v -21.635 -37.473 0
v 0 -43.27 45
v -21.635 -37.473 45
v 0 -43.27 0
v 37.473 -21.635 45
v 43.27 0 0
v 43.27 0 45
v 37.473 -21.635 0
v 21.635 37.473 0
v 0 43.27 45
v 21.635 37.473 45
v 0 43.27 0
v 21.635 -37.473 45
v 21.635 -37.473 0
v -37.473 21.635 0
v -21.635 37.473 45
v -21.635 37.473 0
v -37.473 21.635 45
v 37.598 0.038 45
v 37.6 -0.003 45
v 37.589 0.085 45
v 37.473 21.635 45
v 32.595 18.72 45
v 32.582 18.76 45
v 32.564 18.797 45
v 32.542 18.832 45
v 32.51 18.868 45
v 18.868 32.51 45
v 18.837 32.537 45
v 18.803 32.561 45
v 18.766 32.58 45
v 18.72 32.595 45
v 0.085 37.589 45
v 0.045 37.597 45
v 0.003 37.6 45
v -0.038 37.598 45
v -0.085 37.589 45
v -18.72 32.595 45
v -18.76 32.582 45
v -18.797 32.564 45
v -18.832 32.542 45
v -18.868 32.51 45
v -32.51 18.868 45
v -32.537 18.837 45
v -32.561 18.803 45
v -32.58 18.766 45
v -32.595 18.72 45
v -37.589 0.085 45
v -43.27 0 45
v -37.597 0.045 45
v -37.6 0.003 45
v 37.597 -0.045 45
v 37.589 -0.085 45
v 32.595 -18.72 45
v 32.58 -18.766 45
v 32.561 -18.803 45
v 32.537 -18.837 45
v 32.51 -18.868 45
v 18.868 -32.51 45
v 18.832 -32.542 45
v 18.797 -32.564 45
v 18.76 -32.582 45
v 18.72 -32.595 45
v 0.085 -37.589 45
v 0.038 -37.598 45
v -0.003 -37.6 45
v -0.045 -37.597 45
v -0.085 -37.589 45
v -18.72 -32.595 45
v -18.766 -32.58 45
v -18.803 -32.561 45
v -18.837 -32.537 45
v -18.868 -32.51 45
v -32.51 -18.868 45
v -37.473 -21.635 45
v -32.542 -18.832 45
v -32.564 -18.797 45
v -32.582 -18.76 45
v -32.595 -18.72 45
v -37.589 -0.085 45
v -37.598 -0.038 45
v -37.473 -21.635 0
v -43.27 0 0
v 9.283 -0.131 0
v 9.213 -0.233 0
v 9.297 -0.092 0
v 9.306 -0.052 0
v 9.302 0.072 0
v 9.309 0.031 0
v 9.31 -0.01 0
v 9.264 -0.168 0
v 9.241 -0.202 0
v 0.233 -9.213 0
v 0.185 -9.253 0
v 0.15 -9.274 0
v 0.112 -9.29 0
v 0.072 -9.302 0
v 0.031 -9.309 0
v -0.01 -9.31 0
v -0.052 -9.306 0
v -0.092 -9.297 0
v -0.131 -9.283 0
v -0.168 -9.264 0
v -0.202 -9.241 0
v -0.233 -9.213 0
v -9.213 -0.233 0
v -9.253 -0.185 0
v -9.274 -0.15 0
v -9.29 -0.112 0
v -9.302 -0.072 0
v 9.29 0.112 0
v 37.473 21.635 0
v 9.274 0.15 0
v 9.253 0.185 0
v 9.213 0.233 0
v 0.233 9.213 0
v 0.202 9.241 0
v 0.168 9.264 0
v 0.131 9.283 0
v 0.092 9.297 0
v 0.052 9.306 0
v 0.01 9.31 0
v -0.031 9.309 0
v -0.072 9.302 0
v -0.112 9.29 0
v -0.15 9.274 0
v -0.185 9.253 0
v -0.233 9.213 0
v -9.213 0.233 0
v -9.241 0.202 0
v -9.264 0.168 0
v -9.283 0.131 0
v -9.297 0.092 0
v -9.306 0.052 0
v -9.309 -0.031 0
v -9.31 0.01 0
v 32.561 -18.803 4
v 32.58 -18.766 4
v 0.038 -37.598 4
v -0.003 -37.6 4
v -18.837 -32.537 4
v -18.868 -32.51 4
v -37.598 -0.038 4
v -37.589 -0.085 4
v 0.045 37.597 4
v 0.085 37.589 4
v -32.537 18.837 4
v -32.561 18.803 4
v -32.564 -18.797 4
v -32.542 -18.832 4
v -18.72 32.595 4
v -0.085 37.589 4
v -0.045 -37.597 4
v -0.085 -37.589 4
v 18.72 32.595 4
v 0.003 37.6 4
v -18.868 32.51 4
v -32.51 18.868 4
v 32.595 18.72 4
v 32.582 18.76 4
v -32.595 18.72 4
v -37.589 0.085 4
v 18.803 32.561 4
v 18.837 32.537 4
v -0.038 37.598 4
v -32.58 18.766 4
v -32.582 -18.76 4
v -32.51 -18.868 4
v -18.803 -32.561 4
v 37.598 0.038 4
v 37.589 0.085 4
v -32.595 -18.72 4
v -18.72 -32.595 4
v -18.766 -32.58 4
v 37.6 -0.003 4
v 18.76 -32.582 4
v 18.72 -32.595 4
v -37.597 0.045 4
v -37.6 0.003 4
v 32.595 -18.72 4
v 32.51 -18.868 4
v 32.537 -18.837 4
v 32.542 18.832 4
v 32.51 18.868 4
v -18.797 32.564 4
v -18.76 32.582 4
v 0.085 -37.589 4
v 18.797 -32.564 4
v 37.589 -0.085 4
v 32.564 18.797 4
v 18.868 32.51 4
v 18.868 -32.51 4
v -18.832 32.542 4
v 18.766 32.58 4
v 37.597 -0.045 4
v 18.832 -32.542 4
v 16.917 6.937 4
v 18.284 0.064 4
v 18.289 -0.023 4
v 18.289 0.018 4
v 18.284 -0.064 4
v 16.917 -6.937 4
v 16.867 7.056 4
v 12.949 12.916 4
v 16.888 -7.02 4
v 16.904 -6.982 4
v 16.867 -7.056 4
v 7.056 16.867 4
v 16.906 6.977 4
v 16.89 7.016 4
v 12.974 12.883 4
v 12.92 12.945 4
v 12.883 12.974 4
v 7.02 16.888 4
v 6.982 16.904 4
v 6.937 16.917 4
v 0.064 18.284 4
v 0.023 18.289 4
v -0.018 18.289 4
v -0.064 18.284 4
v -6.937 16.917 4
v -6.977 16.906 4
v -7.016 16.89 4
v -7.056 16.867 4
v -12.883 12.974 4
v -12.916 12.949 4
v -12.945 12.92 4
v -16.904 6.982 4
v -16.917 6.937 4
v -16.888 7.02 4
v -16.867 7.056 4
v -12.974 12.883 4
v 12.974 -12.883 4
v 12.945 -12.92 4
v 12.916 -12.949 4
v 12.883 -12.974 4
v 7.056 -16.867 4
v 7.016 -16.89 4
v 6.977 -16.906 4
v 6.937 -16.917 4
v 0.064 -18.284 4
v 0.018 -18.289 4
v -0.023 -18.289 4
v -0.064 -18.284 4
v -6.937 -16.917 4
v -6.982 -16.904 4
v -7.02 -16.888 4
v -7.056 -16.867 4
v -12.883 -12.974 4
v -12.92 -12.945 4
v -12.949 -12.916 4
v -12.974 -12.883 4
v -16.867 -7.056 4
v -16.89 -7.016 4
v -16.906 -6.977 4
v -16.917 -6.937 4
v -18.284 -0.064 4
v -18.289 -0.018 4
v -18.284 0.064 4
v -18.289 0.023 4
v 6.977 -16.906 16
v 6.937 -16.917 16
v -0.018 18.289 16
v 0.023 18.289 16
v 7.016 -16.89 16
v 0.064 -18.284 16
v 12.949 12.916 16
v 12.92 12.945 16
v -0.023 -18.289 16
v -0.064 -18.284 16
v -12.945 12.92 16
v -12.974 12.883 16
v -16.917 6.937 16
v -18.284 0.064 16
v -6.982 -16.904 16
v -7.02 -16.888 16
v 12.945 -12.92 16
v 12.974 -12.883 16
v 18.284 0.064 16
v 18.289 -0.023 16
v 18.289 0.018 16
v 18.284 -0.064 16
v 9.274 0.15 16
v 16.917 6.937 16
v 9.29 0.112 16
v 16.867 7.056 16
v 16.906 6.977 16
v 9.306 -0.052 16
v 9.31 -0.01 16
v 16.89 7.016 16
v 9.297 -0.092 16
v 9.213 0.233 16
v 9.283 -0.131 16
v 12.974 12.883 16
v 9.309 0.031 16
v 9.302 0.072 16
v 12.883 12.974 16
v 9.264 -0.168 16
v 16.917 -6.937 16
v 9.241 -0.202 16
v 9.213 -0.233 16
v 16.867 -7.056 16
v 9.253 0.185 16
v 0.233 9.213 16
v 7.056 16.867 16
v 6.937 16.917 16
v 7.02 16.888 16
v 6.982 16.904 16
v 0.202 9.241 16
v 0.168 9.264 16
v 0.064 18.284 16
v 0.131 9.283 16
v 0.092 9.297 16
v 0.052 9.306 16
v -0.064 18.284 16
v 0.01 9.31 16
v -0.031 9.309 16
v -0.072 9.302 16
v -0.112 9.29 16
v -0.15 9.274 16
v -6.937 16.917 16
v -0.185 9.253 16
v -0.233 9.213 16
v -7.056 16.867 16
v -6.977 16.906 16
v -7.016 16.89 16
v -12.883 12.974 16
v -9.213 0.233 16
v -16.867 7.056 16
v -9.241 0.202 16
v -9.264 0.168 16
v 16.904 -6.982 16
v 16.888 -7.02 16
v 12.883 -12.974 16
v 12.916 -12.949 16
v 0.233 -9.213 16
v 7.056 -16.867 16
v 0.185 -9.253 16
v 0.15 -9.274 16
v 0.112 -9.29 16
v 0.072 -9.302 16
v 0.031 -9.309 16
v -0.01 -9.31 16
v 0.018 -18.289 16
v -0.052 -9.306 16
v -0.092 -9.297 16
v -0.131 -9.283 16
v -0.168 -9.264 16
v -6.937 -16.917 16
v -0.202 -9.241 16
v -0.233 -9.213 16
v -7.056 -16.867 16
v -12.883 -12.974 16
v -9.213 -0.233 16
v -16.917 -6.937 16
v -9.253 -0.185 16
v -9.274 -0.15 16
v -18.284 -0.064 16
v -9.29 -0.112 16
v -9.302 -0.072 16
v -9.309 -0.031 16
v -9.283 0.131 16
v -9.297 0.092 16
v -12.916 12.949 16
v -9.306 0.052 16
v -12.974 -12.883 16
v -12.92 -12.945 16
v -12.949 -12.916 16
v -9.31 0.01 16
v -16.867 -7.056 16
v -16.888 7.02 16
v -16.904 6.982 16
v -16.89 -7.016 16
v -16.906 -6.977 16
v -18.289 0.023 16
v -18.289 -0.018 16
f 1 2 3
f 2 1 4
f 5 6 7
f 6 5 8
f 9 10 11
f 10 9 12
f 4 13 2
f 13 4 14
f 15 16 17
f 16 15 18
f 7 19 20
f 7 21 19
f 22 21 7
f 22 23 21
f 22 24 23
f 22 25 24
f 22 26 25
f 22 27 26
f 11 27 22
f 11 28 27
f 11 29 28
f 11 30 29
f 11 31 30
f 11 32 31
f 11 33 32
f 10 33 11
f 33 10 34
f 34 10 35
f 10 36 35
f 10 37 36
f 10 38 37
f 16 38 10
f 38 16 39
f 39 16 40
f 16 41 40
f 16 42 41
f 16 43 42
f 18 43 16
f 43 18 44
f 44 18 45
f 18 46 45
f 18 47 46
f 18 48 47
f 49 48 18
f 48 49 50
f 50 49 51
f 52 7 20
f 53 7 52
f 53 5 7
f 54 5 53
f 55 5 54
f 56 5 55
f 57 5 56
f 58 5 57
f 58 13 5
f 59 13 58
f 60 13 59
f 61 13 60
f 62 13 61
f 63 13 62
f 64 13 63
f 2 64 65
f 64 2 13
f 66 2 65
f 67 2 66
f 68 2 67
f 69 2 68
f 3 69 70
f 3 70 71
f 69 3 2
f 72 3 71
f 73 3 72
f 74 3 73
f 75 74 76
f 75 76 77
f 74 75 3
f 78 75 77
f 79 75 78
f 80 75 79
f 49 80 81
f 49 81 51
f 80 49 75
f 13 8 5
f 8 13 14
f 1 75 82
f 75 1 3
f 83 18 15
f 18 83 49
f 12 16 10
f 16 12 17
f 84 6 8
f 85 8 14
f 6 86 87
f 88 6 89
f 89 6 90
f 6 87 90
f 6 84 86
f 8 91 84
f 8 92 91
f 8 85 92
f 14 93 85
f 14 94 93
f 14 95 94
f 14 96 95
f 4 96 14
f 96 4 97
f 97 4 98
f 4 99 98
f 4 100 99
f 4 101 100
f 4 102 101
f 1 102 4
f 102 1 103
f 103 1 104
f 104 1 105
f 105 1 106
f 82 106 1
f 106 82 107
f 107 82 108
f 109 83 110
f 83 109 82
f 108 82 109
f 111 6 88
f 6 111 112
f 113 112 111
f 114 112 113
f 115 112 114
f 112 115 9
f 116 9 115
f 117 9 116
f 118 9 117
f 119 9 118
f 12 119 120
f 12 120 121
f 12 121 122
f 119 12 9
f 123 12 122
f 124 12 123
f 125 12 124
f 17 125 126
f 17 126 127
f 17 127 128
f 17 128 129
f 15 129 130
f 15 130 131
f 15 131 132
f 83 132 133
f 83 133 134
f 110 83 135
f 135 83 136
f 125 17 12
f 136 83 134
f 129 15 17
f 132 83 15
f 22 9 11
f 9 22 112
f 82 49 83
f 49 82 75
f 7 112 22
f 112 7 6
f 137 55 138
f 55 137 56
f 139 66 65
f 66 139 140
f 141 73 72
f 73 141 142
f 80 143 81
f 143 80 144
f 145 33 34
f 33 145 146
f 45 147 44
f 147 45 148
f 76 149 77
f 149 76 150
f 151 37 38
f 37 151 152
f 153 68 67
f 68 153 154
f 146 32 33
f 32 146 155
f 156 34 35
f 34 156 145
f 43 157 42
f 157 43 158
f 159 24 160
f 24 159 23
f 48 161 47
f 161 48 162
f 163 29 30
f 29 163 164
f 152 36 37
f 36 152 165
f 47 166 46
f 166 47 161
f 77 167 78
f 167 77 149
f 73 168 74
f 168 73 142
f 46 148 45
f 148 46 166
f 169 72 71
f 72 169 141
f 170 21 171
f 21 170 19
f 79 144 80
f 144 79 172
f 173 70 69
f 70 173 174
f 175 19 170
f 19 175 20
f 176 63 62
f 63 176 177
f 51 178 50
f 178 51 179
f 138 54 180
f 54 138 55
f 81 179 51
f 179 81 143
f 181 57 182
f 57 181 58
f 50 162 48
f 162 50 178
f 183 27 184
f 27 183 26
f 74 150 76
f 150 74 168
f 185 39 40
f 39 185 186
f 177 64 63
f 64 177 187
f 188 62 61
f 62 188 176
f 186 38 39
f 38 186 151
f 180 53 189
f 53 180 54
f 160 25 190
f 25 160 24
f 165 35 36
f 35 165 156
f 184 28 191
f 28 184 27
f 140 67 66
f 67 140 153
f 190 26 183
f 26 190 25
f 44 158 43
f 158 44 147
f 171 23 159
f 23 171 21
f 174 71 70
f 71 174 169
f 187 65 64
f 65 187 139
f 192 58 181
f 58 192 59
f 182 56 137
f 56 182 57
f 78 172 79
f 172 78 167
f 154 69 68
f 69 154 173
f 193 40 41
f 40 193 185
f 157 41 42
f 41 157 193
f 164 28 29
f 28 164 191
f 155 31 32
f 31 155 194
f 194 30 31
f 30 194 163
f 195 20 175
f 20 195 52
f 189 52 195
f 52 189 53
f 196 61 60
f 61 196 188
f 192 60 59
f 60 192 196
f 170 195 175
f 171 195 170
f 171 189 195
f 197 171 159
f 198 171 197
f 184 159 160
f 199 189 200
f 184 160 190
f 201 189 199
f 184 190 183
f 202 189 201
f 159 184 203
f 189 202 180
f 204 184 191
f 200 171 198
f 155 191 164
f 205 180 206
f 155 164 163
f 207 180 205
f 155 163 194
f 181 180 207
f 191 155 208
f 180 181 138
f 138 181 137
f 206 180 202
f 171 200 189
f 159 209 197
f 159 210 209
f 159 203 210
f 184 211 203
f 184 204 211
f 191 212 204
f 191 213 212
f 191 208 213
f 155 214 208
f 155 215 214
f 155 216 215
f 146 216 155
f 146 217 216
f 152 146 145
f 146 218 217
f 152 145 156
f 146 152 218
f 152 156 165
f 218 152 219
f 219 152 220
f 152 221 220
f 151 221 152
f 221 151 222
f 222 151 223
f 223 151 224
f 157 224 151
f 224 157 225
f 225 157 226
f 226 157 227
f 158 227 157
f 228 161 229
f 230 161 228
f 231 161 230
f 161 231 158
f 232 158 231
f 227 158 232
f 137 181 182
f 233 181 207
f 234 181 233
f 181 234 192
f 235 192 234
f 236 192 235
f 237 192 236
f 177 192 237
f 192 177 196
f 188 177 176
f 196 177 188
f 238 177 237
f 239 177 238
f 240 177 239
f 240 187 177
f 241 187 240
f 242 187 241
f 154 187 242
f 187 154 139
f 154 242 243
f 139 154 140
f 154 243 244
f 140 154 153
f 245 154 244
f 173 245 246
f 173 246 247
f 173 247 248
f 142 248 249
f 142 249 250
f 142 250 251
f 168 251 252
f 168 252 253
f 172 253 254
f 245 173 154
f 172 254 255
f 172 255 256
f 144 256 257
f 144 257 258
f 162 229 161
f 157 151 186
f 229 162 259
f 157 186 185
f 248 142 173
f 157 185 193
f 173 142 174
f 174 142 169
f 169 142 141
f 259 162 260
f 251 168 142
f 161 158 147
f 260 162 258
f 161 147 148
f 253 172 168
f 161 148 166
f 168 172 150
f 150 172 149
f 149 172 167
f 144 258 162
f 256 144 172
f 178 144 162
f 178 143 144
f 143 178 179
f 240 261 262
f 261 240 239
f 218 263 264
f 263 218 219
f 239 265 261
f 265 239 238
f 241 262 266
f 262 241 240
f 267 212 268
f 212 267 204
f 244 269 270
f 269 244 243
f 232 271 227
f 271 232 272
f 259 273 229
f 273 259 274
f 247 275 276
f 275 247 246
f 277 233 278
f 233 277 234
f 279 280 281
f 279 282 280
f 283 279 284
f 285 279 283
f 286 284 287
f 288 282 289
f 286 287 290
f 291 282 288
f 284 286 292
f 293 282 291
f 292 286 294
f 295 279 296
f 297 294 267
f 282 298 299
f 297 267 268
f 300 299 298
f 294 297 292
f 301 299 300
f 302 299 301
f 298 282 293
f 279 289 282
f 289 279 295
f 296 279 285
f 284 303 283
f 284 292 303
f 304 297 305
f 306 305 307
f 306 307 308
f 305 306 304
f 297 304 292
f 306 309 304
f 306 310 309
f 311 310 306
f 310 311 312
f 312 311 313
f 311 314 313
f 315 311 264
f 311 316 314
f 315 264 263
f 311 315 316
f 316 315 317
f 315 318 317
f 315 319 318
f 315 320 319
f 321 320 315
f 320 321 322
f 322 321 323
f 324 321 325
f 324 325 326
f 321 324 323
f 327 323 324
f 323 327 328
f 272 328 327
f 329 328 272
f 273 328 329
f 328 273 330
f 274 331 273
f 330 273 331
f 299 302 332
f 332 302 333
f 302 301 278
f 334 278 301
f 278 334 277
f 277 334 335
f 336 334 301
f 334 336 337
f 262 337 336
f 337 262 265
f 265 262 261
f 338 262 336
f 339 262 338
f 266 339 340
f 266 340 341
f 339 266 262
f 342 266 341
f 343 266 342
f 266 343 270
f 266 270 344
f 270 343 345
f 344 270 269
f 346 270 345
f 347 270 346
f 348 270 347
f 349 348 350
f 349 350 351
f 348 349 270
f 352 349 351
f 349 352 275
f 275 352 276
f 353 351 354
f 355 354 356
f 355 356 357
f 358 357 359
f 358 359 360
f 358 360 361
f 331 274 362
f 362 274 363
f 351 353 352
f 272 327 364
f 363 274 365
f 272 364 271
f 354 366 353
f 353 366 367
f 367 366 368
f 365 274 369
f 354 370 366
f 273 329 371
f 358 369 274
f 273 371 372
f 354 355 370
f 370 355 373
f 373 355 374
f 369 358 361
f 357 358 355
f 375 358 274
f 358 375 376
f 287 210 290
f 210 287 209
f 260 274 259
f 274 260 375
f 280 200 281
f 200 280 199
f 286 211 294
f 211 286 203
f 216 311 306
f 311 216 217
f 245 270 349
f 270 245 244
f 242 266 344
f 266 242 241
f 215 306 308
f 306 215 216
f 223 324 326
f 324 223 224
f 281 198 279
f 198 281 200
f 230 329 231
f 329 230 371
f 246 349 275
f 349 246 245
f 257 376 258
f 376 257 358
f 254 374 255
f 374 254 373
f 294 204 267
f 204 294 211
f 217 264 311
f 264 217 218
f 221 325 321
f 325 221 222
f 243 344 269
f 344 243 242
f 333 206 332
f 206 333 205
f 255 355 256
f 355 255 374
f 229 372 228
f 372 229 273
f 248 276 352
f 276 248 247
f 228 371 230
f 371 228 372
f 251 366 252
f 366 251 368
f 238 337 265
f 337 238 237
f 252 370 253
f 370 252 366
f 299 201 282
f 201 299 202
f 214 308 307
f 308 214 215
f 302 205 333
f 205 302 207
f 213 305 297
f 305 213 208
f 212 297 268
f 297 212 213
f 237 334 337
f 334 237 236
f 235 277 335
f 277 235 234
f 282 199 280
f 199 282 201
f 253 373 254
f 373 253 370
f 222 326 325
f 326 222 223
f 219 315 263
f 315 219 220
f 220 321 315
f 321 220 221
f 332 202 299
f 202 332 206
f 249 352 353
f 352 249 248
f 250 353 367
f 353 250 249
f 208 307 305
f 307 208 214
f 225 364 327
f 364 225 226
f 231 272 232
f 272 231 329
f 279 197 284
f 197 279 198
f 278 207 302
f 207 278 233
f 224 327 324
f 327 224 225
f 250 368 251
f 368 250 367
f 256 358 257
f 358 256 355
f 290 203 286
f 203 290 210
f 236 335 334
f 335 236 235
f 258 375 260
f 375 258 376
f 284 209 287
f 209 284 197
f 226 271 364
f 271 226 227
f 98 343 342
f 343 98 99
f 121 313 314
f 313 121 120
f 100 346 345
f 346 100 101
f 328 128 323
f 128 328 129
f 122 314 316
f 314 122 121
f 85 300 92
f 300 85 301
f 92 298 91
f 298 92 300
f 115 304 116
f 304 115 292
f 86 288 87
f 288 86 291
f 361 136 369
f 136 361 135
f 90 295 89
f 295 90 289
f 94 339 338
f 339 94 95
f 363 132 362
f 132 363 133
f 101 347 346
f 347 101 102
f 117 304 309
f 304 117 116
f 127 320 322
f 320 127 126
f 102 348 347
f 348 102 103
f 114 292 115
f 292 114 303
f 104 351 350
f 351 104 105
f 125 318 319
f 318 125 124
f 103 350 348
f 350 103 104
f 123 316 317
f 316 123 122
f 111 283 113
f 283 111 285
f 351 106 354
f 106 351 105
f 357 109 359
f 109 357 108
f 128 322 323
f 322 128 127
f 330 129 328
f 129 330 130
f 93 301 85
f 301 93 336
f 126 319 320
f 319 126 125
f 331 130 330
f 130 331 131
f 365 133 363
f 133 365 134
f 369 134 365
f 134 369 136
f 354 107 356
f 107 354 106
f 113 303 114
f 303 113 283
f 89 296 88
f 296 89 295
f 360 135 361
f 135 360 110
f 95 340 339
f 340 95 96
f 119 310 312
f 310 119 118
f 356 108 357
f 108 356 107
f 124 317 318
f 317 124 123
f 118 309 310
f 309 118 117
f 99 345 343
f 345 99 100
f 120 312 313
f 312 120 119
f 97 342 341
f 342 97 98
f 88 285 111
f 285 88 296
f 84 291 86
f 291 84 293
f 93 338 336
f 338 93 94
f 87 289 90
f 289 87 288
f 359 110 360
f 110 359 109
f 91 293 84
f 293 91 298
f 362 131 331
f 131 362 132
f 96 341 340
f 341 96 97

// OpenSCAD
// NOTE:  All dimensions in mm except ratchet size

// version 5:  Use face-to-face measurement for even number of sides


//-------------------------------------------
//        User-entered parameters
//
//  Formatted for thingiverse customizer.
//-------------------------------------------

// Number of faces on filter body:
num_faces = 12;                     // [6:30]

// Diameter of filter body in mm.  Measure from face to face (even) or face to vertex (odd).
filter_diameter_mm = 72;

// Depth of usable portion of tool in mm.  (Height above bottom and drive).
usable_tool_depth_mm = 29;

// Ratchet drive size in inches.
drive_size_inches = 0.5;            // [0.375, 0.5]

// Thickness of tool wall in mm.
wall_thickness_mm = 6;

// Thickness of tool bottom in mm.
bottom_thickness_mm = 4;

// Make the outside round?
round_outside = 0;                  // [0:No,1:Yes]




/* [Hidden] */

$fn=50;

// Compute the radius from center to inner corner:
angle = 180 / num_faces;
r_to_face_if_odd_mm = (cos(angle) / (1+cos(angle))) * filter_diameter_mm;
R_if_even_mm = (filter_diameter_mm / 2) / cos(angle);
is_odd = (num_faces % 2);
radius_to_corners_mm = is_odd ? filter_diameter_mm - r_to_face_if_odd_mm : R_if_even_mm;     // from center to "corner", not face
filter_slop_r_mm = 0.33;

//echo (radius_to_corners_mm);

// 1/2" drive is exactly 8.98mm radius
// 3/8" drive is exactly 6.74mm radius
drive_hole_r_mm = (drive_size_inches > 0.4) ?  8.98 :  6.74;

// 1/2" drive is 16mm tall
// 3/8" drive is 11mm tall
drive_height_mm = (drive_size_inches > 0.4) ? 16.00 : 11.00;

drive_hole_slop_r_mm = 0.33;
drive_thickness_r_mm = drive_hole_r_mm;

outside_faces = round_outside ? 100 : num_faces;
outside_height_mm = usable_tool_depth_mm + max(drive_height_mm,bottom_thickness_mm);



difference()
{
    union()
    {
        difference()
        {
            // Outside body:
            linear_extrude(outside_height_mm)
                my_regular_polygon(outside_faces, radius_to_corners_mm+wall_thickness_mm);
            
            // Main Polygon hole:
            translate([0,0,bottom_thickness_mm])
                linear_extrude(outside_height_mm - bottom_thickness_mm)
                    offset(filter_slop_r_mm)
                        my_regular_polygon(num_faces, radius_to_corners_mm);
        }

        // Drive body:
        linear_extrude(drive_height_mm)
            offset(drive_hole_slop_r_mm)
                my_regular_polygon(16,drive_hole_r_mm+drive_thickness_r_mm);
    }

    // Drive hole:
    linear_extrude(drive_height_mm)
        offset(drive_hole_slop_r_mm)
            my_regular_polygon(4,drive_hole_r_mm);
}





module my_regular_polygon(faces, radius)
{
    $fn = faces;
    circle(radius);
}
